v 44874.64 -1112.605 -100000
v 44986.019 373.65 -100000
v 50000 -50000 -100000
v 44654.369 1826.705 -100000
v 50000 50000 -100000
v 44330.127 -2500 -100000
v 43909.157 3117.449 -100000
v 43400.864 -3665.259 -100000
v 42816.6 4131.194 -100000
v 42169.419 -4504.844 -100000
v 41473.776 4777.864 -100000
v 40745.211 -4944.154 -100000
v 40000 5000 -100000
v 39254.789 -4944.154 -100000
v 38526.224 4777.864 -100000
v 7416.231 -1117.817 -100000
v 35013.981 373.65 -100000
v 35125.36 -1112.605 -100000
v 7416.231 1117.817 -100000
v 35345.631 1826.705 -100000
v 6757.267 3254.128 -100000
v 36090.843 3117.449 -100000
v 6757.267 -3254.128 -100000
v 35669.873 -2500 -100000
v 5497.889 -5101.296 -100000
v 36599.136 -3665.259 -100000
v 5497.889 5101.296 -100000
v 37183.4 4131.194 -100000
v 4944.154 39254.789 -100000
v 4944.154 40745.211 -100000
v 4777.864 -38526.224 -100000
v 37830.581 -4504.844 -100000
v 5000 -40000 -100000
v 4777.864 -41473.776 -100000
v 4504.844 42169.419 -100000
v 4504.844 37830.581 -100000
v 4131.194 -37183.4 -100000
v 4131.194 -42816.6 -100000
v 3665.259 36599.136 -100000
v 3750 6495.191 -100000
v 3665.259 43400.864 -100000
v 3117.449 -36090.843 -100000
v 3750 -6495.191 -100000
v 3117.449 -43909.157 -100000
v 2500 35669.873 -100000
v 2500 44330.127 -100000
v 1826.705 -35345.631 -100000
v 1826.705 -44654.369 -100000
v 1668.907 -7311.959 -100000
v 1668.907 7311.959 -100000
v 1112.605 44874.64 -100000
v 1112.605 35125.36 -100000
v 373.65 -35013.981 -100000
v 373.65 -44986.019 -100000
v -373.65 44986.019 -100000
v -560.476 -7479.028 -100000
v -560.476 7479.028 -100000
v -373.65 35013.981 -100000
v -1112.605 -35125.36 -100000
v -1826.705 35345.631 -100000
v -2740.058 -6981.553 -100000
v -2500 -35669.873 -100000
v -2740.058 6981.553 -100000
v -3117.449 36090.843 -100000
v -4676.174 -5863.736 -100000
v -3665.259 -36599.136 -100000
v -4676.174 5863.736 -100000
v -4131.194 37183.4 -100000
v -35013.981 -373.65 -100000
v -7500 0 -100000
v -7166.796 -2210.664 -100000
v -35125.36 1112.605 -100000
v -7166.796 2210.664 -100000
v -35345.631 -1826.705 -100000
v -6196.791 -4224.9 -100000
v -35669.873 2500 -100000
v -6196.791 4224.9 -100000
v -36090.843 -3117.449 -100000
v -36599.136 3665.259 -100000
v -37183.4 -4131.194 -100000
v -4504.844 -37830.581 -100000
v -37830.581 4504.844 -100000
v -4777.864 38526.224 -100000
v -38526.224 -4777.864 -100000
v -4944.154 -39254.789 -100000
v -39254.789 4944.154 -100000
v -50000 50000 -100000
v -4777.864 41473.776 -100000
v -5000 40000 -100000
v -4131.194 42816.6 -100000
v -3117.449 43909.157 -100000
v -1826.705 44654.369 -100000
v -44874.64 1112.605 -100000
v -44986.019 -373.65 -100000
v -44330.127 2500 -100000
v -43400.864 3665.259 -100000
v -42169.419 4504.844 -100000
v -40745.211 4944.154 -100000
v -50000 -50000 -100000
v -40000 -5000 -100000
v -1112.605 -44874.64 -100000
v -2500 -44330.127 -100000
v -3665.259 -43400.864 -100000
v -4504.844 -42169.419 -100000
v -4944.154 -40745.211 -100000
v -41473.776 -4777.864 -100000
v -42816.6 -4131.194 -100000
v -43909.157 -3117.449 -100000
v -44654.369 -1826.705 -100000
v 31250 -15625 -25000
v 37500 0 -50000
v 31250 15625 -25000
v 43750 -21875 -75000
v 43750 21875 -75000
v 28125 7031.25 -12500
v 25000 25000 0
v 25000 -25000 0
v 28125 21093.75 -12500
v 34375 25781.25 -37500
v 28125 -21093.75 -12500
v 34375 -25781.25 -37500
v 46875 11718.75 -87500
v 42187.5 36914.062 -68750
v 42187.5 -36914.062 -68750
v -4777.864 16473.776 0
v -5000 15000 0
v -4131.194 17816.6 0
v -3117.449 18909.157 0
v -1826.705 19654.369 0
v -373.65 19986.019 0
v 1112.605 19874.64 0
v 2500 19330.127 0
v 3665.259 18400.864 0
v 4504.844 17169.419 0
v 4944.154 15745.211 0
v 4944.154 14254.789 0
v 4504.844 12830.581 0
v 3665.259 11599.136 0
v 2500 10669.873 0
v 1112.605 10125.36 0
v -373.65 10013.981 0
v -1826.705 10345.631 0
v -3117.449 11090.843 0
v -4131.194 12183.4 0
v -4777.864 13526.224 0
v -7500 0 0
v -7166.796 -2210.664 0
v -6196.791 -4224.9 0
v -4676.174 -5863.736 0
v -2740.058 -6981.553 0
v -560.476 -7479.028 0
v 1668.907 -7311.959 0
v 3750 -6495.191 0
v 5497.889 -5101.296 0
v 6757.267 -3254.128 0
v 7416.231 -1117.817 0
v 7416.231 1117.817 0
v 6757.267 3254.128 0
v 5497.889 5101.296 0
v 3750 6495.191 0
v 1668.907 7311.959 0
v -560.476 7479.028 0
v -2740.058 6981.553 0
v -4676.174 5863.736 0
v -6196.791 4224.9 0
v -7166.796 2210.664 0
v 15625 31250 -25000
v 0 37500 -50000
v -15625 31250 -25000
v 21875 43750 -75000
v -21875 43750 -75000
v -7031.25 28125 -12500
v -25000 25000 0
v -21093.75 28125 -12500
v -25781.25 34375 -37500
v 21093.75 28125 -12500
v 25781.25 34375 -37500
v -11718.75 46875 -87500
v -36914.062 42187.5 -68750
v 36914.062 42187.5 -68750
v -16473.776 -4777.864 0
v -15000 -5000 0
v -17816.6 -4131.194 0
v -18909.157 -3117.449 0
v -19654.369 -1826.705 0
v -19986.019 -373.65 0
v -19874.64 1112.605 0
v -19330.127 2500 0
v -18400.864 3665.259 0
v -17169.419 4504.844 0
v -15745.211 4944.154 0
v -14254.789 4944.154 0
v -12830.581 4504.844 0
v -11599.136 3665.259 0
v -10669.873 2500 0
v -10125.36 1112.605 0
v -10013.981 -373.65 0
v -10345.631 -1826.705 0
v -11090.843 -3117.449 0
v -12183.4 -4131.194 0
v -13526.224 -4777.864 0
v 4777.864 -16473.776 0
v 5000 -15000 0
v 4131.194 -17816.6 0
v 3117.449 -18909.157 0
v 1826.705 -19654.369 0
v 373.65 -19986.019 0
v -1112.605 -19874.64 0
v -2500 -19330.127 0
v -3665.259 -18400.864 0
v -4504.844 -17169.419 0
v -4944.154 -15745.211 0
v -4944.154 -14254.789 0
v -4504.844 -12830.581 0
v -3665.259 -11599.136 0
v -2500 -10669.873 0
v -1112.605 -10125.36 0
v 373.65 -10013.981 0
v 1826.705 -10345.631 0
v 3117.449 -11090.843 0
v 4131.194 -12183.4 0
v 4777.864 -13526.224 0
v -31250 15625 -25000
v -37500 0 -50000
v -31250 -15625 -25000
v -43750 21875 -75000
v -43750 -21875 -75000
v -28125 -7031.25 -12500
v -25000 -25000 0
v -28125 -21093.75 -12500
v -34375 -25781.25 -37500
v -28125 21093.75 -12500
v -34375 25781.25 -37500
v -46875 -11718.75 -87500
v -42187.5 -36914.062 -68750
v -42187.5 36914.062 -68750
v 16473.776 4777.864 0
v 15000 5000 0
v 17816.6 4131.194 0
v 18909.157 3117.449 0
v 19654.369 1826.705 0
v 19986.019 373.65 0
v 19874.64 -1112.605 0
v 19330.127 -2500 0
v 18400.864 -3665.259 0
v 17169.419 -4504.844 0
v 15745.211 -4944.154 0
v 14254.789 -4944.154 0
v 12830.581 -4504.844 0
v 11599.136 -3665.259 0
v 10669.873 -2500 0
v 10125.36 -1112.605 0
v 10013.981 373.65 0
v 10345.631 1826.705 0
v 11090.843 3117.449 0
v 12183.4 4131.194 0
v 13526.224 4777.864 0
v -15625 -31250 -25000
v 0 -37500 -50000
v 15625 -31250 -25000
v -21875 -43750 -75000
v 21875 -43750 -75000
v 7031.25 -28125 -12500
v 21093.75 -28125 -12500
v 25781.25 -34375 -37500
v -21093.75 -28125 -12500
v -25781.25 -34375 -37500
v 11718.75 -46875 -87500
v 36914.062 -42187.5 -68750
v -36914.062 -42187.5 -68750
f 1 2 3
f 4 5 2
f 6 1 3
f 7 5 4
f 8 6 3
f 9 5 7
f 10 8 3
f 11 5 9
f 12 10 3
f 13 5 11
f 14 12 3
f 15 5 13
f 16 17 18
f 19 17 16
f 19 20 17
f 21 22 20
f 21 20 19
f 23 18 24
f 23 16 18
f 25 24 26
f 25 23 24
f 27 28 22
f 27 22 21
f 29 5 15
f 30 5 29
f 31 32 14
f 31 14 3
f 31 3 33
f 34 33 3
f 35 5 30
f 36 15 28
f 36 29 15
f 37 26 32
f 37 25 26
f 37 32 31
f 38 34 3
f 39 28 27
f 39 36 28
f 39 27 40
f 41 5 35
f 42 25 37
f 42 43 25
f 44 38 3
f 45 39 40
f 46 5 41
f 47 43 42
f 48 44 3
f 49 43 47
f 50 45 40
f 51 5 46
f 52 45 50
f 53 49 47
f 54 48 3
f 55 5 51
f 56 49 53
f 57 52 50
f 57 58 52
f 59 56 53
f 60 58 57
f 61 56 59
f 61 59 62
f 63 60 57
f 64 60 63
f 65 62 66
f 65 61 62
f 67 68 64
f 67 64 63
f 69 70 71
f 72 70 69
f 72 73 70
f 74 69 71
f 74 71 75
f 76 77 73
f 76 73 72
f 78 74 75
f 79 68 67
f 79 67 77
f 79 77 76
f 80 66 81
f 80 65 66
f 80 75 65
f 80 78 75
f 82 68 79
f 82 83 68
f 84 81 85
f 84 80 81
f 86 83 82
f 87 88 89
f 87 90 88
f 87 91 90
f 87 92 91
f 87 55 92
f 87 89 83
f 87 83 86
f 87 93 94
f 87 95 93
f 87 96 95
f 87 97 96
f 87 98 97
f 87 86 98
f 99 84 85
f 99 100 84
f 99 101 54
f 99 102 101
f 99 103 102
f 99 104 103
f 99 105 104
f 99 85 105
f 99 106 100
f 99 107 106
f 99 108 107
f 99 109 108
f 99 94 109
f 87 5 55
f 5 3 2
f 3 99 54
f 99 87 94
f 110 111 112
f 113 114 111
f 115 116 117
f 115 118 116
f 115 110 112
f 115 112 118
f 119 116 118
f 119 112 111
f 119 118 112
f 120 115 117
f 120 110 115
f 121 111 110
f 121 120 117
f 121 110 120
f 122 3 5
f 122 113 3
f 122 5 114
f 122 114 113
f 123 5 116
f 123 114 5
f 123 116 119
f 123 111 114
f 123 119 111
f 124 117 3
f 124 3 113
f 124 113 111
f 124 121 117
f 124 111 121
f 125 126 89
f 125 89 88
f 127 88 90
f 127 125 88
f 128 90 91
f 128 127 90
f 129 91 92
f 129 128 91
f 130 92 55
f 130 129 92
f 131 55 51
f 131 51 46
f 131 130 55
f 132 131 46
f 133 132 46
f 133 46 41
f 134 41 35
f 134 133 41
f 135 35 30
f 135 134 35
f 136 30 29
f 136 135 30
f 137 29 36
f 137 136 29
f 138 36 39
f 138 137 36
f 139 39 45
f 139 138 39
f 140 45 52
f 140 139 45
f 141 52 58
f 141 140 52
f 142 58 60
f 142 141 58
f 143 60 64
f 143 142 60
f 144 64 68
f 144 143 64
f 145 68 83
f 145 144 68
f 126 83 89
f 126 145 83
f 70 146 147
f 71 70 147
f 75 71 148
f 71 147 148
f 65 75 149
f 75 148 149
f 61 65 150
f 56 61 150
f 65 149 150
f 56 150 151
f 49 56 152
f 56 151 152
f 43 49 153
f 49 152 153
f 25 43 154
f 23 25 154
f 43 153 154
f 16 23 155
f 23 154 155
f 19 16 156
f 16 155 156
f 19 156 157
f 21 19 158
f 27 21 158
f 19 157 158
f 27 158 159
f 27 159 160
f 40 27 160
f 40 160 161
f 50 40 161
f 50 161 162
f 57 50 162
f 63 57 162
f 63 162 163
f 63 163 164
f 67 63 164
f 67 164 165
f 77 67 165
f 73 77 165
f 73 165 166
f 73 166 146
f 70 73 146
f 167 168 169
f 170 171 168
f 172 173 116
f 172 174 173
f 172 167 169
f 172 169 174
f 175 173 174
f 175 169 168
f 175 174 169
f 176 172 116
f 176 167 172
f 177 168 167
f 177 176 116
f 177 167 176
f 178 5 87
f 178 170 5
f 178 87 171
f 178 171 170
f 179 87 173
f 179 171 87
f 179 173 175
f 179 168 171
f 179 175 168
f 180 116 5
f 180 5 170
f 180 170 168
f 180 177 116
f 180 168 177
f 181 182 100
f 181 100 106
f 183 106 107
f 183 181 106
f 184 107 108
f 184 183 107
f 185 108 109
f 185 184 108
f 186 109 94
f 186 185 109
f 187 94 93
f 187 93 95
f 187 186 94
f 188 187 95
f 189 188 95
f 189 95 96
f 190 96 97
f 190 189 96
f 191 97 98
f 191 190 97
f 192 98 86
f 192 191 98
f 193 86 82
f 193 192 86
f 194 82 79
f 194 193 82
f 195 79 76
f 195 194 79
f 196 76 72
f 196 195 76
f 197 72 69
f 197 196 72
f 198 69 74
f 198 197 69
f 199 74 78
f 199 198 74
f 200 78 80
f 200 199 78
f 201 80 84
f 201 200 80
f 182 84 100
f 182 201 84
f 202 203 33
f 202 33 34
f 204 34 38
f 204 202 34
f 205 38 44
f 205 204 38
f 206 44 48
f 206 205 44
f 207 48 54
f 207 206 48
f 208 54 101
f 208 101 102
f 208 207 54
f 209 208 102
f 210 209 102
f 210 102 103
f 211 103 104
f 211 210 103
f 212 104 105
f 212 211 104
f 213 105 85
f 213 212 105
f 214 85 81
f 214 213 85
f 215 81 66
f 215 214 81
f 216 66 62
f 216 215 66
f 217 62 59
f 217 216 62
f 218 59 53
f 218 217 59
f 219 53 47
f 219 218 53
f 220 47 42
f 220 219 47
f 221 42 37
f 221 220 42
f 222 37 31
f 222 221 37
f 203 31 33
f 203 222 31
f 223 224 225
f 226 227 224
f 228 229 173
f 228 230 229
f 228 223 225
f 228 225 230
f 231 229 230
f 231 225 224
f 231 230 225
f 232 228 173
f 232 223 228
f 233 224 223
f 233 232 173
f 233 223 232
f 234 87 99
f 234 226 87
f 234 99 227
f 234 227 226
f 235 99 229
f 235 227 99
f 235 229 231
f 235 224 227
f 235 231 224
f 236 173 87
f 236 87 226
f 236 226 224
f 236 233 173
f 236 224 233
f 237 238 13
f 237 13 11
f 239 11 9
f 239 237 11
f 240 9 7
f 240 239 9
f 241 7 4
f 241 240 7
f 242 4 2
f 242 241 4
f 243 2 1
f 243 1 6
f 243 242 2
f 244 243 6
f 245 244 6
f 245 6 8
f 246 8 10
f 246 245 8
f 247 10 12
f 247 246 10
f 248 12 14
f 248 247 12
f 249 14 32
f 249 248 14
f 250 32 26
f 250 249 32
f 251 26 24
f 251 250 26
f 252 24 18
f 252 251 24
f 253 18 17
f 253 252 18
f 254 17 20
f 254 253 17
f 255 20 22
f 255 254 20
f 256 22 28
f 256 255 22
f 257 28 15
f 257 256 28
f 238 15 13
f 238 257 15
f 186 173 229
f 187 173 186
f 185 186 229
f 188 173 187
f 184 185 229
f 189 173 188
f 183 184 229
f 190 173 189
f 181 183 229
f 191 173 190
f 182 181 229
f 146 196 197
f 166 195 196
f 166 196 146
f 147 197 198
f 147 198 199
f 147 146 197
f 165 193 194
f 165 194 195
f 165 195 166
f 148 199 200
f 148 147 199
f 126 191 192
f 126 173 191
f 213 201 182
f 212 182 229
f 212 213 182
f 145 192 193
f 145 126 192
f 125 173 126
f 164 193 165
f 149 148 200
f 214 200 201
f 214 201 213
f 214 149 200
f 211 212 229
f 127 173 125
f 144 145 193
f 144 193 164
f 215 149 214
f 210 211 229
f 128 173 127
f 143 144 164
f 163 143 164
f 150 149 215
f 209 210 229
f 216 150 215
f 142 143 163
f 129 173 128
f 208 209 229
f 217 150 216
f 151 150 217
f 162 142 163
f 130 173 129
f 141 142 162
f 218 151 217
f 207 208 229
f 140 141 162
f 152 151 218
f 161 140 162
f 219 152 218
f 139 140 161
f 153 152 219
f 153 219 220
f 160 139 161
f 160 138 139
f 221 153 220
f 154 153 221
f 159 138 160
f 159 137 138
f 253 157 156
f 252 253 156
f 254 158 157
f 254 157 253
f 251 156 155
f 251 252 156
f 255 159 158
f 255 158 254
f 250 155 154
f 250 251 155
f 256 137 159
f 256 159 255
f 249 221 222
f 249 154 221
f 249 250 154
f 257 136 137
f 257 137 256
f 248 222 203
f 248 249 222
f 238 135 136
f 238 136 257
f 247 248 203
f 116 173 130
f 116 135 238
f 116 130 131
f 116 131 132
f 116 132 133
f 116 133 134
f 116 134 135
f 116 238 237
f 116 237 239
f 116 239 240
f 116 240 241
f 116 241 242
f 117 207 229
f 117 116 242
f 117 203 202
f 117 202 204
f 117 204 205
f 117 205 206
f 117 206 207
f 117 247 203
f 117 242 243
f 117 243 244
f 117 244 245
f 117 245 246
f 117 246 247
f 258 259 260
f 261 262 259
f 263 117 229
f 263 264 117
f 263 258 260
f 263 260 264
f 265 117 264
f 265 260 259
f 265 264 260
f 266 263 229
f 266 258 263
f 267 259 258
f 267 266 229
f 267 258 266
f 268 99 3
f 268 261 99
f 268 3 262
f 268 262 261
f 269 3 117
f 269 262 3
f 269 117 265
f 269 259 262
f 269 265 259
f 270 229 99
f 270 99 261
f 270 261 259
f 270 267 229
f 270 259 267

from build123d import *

# Parameters (mm, degrees)
SKETCH13_R        = 7500
SKETCH14_R        = 5000
CIRPATTERN1_COUNT = 4


with BuildPart() as part:
    # Sketch1 → Loft1 section 0
    with BuildSketch(Plane.XY):
        with BuildLine():
            Line((-25000, 25000), (25000, 25000))
            Line((25000, 25000), (25000, -25000))
            Line((25000, -25000), (-25000, -25000))
            Line((-25000, -25000), (-25000, 25000))
        make_face()
    # Sketch2 → Loft1 section 1
    with BuildSketch(Plane.XY.offset(-100000)):
        with BuildLine():
            Line((-50000, -50000), (50000, -50000))
            Line((50000, -50000), (50000, 50000))
            Line((50000, 50000), (-50000, 50000))
            Line((-50000, 50000), (-50000, -50000))
        make_face()
    loft()

    # Cut-Sweep1: sweep along a path in Sketch12
    with BuildLine(Plane(origin=(0, 0, 0), x_dir=(1, 0, 0), z_dir=(0, 1, 0))) as cut_sweep1_path:
        Line((0, 100000), (0, 0))
    # Sketch13 → Cut-Sweep1 (sweep, cut)
    with BuildSketch(Plane(origin=(0, 0, -100000), x_dir=(-1, 0, 0), z_dir=(0, 0, -1))):
        Circle(SKETCH13_R)
    sweep(path=cut_sweep1_path.line, mode=Mode.SUBTRACT)

    # Cut-Sweep2: sweep along a path in Sketch17
    with BuildLine(Plane(origin=(0, 0, 0), x_dir=(0, 0, -1), z_dir=(1, 0, 0))) as cut_sweep2_path:
        Line((100000, 40000), (0, 15000))
    # Sketch14 → Cut-Sweep2 (sweep, cut)
    with BuildSketch(Plane(origin=(0, 0, -100000), x_dir=(-1, 0, 0), z_dir=(0, 0, -1))):
        with Locations((0, 40000)):
            Circle(SKETCH14_R)
    cut_sweep2 = sweep(path=cut_sweep2_path.line, mode=Mode.SUBTRACT)

    # CirPattern1: Cut-Sweep2 ×4 about axis
    cirpattern1_axis = Axis((0, 0, -101000), (0, 0, 1))
    for i in range(1, CIRPATTERN1_COUNT):
        add(cut_sweep2.rotate(cirpattern1_axis, i * 360 / CIRPATTERN1_COUNT), mode=Mode.SUBTRACT)


solid = part.part
